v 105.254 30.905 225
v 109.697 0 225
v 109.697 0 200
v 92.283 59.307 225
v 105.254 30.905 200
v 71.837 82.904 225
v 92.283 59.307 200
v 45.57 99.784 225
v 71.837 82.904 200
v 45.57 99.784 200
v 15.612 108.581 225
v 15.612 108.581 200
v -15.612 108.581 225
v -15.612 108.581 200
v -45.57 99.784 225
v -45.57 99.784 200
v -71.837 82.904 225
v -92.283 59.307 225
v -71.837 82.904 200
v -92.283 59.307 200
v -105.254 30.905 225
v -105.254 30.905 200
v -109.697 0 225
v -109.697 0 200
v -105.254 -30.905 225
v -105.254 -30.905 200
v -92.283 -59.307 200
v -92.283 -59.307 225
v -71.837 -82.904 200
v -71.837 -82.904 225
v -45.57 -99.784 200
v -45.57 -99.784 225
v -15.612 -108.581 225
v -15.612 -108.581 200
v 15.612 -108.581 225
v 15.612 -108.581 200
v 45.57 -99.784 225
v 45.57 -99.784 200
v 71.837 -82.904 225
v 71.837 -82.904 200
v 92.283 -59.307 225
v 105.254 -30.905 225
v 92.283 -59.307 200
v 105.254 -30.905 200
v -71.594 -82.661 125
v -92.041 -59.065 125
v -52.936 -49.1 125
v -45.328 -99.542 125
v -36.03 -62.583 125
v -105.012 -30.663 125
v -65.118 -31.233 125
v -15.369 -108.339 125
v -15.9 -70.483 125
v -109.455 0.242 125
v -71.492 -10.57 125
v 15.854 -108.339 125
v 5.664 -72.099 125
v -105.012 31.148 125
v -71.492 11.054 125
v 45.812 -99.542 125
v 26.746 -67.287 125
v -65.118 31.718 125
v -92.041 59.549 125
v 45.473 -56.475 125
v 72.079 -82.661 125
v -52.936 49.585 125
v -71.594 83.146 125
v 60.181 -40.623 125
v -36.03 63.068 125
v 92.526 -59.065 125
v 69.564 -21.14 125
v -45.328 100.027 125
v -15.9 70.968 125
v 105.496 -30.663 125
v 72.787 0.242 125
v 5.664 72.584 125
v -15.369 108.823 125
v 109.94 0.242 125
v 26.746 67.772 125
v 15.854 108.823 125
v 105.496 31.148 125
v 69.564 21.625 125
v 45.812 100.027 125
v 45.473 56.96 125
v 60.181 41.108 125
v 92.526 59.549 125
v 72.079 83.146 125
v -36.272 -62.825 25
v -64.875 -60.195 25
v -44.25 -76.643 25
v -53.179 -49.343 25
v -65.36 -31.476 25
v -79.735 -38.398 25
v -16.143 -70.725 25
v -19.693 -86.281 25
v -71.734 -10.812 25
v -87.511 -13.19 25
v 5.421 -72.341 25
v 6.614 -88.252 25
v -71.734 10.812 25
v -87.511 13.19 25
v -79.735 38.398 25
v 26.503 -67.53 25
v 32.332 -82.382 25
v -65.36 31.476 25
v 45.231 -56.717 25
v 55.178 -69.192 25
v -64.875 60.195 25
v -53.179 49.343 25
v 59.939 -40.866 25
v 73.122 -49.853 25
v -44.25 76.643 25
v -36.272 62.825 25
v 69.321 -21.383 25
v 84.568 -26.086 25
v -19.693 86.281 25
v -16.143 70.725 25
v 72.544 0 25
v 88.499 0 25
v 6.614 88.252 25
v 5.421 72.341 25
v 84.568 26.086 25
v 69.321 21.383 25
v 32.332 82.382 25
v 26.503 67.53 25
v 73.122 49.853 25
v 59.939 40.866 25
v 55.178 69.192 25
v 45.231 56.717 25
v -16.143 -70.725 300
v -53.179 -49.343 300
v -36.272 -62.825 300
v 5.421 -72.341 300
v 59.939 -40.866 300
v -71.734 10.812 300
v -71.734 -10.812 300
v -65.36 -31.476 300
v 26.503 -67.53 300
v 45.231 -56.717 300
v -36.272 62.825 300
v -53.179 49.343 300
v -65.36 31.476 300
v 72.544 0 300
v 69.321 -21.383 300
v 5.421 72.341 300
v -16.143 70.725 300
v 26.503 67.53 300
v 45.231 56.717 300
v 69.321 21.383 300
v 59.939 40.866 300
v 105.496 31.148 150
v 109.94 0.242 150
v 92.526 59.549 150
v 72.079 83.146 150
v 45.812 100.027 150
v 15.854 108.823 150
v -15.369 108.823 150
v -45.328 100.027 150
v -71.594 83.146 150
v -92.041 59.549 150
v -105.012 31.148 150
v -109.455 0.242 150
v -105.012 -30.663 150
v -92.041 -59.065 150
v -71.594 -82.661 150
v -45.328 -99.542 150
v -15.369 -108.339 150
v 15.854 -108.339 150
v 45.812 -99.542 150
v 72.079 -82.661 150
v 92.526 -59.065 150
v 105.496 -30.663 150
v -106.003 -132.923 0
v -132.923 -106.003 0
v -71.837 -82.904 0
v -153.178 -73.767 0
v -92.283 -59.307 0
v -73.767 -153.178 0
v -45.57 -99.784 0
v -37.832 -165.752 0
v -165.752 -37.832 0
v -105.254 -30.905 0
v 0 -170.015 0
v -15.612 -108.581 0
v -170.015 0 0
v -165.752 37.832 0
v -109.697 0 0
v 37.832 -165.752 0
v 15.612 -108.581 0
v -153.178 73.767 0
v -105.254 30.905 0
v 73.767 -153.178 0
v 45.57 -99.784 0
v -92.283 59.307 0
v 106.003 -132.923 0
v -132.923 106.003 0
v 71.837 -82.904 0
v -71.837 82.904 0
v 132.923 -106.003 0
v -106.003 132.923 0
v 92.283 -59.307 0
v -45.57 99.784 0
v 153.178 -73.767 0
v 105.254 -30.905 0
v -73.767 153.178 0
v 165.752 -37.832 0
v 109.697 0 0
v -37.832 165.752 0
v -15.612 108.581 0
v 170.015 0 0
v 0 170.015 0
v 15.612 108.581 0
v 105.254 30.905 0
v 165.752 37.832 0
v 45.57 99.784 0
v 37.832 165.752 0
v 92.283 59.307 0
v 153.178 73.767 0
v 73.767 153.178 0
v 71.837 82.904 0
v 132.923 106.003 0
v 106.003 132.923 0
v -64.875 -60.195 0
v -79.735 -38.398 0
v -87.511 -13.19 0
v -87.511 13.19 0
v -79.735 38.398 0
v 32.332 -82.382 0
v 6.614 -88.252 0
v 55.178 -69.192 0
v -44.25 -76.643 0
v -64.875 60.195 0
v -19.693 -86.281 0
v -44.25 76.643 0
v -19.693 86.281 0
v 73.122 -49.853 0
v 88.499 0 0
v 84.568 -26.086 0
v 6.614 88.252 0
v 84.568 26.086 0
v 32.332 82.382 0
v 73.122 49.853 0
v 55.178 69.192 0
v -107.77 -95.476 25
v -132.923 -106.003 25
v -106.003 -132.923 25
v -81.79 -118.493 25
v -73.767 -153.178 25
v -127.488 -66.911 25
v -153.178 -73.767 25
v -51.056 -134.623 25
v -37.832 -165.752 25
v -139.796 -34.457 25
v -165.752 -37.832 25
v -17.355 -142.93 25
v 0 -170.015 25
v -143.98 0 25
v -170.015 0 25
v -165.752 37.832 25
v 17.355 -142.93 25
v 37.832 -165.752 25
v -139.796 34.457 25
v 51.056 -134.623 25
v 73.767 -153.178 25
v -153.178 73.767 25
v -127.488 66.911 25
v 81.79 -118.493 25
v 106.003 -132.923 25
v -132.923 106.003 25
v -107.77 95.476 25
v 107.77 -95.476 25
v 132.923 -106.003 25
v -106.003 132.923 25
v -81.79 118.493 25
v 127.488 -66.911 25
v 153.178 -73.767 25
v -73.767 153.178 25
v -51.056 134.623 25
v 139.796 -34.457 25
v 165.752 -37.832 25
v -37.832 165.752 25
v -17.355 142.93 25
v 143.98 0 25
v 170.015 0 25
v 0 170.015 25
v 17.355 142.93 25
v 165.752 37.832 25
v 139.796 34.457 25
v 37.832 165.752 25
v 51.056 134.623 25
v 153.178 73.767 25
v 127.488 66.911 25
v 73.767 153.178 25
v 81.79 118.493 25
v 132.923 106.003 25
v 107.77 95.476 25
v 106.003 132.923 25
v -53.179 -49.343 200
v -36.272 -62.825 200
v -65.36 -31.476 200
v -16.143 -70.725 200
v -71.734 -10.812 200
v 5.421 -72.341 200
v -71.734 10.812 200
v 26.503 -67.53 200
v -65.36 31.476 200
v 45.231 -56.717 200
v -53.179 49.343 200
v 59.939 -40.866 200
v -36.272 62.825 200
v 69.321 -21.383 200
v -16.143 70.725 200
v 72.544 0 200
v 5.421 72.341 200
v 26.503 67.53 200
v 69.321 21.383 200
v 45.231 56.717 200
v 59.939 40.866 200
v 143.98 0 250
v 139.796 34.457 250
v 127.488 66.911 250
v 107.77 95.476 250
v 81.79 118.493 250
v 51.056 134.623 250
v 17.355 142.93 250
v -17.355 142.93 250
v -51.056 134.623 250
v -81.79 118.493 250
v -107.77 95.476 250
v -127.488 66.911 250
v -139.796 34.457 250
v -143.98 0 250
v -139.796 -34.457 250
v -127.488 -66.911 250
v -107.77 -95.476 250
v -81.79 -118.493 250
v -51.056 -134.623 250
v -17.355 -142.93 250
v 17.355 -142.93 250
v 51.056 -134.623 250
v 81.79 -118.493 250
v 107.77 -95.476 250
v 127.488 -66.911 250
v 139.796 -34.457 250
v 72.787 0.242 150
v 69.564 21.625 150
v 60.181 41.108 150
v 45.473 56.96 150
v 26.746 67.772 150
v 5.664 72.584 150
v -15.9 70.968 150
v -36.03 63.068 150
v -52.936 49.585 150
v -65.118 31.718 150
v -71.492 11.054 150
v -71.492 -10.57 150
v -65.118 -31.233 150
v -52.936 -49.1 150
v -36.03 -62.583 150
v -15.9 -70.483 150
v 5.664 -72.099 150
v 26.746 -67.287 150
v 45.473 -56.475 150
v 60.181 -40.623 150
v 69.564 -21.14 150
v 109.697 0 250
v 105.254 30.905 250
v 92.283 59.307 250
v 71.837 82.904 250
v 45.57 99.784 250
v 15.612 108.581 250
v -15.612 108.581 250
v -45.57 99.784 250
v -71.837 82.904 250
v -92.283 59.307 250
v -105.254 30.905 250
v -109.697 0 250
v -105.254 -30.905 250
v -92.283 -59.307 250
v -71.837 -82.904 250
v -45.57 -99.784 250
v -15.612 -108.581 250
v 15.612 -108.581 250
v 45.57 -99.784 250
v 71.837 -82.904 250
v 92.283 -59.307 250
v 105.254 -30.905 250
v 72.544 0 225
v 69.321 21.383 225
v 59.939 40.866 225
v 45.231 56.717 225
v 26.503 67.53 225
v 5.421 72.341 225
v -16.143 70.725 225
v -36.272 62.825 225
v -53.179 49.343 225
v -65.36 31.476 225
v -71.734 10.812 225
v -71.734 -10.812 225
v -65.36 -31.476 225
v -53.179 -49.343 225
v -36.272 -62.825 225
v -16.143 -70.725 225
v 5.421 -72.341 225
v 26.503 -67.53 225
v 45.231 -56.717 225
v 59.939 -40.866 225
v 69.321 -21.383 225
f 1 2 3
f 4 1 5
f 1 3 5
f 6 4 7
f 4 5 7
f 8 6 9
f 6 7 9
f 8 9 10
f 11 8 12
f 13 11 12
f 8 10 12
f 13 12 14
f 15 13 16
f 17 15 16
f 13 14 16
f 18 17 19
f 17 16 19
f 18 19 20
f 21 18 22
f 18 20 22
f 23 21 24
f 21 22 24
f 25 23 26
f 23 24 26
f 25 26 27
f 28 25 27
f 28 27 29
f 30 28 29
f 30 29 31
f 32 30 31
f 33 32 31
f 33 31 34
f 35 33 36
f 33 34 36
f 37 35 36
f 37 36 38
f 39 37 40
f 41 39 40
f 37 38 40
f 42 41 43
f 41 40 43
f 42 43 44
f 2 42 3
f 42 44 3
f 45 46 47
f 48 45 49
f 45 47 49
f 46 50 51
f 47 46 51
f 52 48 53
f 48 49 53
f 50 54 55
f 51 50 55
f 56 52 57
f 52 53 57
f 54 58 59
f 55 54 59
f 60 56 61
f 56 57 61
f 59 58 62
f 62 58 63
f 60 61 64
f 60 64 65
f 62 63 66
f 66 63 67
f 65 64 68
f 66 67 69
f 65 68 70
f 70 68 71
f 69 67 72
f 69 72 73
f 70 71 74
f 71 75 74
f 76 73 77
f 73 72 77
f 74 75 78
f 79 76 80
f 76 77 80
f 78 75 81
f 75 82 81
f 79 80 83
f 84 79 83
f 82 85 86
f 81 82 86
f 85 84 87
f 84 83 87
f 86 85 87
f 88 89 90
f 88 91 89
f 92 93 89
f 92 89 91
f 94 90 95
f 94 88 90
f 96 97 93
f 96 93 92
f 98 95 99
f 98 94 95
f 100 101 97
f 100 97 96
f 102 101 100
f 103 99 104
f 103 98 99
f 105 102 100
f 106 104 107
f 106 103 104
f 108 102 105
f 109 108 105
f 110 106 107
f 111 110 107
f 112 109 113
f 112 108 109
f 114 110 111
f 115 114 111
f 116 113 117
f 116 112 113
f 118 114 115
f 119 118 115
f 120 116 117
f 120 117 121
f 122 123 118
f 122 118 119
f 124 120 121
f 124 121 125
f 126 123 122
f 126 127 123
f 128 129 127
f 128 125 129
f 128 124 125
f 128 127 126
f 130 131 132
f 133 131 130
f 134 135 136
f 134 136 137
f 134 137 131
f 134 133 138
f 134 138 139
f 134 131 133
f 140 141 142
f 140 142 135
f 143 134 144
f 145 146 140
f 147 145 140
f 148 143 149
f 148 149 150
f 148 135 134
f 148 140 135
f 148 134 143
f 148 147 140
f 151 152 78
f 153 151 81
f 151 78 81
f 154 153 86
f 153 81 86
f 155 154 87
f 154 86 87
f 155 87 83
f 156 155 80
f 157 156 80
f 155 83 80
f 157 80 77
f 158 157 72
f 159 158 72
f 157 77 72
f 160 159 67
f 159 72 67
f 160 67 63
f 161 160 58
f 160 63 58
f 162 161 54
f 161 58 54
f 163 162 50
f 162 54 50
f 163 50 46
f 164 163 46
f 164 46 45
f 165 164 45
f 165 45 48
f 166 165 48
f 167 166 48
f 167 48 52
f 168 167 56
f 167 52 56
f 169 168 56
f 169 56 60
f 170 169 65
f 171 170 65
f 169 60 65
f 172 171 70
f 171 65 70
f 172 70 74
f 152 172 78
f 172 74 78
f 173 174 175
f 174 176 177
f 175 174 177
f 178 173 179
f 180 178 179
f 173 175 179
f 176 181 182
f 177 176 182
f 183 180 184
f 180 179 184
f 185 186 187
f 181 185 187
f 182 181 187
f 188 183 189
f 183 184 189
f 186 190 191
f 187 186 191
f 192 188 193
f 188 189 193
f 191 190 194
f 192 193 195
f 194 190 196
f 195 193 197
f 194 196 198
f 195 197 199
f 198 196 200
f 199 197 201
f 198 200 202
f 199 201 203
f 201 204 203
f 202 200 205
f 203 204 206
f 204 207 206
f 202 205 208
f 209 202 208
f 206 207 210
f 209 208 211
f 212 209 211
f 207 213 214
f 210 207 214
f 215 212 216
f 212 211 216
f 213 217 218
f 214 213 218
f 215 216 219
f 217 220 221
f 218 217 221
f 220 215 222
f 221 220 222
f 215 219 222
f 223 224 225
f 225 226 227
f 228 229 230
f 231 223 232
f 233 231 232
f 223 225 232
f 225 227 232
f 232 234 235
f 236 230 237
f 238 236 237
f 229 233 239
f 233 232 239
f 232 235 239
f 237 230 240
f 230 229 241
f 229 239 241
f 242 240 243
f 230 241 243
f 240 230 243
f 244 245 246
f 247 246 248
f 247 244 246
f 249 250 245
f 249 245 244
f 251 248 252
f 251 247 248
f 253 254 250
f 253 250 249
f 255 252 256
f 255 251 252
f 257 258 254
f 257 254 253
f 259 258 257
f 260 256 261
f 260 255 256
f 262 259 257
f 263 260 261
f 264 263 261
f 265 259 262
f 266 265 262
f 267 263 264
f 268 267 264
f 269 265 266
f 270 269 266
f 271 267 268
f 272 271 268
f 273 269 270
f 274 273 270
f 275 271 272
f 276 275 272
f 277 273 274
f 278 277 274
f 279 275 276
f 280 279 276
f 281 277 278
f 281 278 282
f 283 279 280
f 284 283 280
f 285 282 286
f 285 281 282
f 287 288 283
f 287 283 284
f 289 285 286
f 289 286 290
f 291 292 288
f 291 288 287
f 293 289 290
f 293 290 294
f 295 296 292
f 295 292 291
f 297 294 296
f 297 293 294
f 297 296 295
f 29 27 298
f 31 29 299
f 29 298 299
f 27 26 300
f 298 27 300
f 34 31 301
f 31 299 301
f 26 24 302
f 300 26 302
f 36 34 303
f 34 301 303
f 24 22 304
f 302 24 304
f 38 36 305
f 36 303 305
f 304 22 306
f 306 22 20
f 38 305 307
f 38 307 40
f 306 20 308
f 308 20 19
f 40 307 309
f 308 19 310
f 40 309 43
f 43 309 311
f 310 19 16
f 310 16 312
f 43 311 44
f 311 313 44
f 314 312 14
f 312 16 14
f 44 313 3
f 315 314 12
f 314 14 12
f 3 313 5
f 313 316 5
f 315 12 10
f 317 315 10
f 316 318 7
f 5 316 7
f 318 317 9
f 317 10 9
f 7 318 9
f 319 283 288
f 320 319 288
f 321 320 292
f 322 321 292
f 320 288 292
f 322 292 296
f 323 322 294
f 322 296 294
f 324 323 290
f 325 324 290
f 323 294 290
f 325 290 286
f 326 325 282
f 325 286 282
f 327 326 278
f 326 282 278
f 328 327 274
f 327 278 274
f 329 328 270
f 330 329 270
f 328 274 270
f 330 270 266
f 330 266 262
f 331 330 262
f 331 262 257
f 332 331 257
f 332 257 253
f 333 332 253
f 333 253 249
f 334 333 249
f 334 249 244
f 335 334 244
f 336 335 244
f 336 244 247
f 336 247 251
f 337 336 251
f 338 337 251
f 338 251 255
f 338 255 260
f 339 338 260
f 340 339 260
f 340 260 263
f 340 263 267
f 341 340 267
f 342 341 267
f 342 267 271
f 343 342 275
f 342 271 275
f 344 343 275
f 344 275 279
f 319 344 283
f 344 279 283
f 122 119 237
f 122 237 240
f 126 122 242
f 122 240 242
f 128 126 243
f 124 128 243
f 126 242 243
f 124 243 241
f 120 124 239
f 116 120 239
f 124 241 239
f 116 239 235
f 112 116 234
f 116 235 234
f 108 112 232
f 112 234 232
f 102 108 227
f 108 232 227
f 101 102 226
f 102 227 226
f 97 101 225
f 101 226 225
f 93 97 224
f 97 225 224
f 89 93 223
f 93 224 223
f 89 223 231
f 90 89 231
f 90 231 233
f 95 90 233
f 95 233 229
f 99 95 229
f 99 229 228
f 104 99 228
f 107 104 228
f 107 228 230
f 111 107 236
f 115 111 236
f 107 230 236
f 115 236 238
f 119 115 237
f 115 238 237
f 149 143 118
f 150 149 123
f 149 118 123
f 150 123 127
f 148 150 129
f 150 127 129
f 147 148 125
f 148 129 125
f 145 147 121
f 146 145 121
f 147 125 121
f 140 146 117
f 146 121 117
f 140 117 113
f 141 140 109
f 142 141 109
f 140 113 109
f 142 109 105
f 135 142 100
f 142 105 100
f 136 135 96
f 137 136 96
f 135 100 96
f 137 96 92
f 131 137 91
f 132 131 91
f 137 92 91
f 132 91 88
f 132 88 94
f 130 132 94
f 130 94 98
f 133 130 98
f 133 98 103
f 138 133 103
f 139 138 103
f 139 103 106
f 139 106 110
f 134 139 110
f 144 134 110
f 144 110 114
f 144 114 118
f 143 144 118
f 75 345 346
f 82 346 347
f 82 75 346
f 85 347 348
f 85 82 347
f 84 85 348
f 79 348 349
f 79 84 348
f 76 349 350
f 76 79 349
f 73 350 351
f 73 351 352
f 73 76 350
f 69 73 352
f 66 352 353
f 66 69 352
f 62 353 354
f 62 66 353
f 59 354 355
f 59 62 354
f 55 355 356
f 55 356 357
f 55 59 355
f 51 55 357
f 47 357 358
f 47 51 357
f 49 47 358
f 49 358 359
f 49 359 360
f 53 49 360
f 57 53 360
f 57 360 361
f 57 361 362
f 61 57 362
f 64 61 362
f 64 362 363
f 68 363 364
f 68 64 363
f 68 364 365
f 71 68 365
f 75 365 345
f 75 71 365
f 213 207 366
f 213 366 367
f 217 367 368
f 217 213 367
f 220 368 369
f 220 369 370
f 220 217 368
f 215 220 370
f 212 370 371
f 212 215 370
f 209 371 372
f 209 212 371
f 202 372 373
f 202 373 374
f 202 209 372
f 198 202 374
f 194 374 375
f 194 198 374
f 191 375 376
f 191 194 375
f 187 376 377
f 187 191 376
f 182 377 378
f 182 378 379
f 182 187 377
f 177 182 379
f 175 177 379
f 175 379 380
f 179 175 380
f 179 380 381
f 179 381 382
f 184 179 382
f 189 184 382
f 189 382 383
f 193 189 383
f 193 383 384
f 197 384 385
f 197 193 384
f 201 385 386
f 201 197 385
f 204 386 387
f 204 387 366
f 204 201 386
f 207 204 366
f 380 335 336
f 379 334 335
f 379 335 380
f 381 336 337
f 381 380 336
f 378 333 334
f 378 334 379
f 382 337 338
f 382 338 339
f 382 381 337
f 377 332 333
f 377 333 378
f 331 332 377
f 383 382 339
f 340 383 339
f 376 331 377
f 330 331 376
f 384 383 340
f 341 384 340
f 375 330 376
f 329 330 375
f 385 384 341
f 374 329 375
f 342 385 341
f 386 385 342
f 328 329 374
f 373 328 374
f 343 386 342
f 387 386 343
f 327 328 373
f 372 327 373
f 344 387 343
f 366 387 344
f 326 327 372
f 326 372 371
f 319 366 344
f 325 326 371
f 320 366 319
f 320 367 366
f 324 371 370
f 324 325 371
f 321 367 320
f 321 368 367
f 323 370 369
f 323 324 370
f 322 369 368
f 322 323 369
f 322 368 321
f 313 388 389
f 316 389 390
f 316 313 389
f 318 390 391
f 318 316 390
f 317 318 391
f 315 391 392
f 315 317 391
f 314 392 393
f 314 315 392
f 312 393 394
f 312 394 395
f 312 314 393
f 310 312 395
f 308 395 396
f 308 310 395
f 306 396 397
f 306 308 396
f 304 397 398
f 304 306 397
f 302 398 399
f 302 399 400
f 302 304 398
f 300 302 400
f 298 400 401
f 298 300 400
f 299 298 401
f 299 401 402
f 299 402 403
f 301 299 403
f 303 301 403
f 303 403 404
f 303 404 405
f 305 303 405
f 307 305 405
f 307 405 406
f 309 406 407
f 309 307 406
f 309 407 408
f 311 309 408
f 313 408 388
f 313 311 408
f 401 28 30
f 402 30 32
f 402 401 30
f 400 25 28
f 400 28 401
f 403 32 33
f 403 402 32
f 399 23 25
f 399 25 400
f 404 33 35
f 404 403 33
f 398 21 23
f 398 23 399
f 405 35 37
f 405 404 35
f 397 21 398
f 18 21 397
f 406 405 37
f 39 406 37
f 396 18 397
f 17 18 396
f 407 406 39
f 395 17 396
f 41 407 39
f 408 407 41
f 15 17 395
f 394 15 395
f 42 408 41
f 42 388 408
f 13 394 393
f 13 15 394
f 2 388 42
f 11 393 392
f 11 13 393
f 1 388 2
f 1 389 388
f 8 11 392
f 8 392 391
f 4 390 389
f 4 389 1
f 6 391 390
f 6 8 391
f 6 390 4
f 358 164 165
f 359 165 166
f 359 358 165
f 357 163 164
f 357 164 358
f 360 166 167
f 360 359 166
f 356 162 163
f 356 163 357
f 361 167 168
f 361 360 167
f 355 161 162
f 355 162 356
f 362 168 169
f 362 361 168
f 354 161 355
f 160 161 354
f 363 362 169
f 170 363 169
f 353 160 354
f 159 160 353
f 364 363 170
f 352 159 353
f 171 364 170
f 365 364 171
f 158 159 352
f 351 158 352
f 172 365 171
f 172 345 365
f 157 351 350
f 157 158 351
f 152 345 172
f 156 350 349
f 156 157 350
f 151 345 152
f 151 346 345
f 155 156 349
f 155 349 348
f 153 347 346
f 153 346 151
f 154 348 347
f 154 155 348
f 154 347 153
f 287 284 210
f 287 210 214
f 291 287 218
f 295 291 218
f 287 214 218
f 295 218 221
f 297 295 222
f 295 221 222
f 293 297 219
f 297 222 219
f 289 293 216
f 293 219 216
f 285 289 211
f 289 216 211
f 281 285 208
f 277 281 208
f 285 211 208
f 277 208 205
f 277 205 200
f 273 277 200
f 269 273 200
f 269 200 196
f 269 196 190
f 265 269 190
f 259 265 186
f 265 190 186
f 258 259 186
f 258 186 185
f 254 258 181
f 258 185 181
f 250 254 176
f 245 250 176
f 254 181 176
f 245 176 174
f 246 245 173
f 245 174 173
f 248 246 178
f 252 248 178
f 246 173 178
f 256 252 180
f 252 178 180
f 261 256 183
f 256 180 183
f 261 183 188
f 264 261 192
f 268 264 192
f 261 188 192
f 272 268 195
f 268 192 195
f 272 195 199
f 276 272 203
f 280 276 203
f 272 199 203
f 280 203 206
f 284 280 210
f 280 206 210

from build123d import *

# Parameters (mm, degrees)
F0_R     = 170.014979
F0_R_2   = 143.979715
F1_DEPTH = 25
F0_R_3   = 109.697428
F2_DEPTH = 250
F0_R_4   = 72.544287
F3_DEPTH = 300
F0_R_5   = 88.499419
F4_DEPTH = 25
F7_R     = 109.697428
F7_R_2   = 72.544287
F8_R     = 109.697428
F8_R_2   = 72.544287
F9_DEPTH = 25


with BuildPart() as f1:
    # F0 (on Top) → F1 (new body)
    with BuildSketch(Plane.XY):
        Circle(F0_R)
        Circle(F0_R_2, mode=Mode.SUBTRACT)
    extrude(amount=F1_DEPTH)

    # F0 (on Top) → F2 (join)
    with BuildSketch(Plane.XY):
        Circle(F0_R_2)
        Circle(F0_R_3, mode=Mode.SUBTRACT)
    extrude(amount=F2_DEPTH)


with BuildPart() as f3:
    # F0 (on Top) → F3 (new body)
    with BuildSketch(Plane.XY):
        Circle(F0_R_4)
    extrude(amount=F3_DEPTH)

    # F0 (on Top) → F4 (join)
    with BuildSketch(Plane.XY):
        Circle(F0_R_5)
        Circle(F0_R_4, mode=Mode.SUBTRACT)
    extrude(amount=F4_DEPTH)


with BuildPart() as f9:
    # F7 (on offset) + F8 (on offset) → F9 (new body)
    with BuildSketch(Plane.XY.offset(125)):
        with Locations((0.242331, 0.242329)):
            Circle(F7_R)
        with Locations((0.242331, 0.242329)):
            Circle(F7_R_2, mode=Mode.SUBTRACT)
    with BuildSketch(Plane.XY.offset(200)):
        Circle(F8_R)
        Circle(F8_R_2, mode=Mode.SUBTRACT)
    extrude(amount=F9_DEPTH)


solid = Compound([f1.part, f3.part, f9.part])
